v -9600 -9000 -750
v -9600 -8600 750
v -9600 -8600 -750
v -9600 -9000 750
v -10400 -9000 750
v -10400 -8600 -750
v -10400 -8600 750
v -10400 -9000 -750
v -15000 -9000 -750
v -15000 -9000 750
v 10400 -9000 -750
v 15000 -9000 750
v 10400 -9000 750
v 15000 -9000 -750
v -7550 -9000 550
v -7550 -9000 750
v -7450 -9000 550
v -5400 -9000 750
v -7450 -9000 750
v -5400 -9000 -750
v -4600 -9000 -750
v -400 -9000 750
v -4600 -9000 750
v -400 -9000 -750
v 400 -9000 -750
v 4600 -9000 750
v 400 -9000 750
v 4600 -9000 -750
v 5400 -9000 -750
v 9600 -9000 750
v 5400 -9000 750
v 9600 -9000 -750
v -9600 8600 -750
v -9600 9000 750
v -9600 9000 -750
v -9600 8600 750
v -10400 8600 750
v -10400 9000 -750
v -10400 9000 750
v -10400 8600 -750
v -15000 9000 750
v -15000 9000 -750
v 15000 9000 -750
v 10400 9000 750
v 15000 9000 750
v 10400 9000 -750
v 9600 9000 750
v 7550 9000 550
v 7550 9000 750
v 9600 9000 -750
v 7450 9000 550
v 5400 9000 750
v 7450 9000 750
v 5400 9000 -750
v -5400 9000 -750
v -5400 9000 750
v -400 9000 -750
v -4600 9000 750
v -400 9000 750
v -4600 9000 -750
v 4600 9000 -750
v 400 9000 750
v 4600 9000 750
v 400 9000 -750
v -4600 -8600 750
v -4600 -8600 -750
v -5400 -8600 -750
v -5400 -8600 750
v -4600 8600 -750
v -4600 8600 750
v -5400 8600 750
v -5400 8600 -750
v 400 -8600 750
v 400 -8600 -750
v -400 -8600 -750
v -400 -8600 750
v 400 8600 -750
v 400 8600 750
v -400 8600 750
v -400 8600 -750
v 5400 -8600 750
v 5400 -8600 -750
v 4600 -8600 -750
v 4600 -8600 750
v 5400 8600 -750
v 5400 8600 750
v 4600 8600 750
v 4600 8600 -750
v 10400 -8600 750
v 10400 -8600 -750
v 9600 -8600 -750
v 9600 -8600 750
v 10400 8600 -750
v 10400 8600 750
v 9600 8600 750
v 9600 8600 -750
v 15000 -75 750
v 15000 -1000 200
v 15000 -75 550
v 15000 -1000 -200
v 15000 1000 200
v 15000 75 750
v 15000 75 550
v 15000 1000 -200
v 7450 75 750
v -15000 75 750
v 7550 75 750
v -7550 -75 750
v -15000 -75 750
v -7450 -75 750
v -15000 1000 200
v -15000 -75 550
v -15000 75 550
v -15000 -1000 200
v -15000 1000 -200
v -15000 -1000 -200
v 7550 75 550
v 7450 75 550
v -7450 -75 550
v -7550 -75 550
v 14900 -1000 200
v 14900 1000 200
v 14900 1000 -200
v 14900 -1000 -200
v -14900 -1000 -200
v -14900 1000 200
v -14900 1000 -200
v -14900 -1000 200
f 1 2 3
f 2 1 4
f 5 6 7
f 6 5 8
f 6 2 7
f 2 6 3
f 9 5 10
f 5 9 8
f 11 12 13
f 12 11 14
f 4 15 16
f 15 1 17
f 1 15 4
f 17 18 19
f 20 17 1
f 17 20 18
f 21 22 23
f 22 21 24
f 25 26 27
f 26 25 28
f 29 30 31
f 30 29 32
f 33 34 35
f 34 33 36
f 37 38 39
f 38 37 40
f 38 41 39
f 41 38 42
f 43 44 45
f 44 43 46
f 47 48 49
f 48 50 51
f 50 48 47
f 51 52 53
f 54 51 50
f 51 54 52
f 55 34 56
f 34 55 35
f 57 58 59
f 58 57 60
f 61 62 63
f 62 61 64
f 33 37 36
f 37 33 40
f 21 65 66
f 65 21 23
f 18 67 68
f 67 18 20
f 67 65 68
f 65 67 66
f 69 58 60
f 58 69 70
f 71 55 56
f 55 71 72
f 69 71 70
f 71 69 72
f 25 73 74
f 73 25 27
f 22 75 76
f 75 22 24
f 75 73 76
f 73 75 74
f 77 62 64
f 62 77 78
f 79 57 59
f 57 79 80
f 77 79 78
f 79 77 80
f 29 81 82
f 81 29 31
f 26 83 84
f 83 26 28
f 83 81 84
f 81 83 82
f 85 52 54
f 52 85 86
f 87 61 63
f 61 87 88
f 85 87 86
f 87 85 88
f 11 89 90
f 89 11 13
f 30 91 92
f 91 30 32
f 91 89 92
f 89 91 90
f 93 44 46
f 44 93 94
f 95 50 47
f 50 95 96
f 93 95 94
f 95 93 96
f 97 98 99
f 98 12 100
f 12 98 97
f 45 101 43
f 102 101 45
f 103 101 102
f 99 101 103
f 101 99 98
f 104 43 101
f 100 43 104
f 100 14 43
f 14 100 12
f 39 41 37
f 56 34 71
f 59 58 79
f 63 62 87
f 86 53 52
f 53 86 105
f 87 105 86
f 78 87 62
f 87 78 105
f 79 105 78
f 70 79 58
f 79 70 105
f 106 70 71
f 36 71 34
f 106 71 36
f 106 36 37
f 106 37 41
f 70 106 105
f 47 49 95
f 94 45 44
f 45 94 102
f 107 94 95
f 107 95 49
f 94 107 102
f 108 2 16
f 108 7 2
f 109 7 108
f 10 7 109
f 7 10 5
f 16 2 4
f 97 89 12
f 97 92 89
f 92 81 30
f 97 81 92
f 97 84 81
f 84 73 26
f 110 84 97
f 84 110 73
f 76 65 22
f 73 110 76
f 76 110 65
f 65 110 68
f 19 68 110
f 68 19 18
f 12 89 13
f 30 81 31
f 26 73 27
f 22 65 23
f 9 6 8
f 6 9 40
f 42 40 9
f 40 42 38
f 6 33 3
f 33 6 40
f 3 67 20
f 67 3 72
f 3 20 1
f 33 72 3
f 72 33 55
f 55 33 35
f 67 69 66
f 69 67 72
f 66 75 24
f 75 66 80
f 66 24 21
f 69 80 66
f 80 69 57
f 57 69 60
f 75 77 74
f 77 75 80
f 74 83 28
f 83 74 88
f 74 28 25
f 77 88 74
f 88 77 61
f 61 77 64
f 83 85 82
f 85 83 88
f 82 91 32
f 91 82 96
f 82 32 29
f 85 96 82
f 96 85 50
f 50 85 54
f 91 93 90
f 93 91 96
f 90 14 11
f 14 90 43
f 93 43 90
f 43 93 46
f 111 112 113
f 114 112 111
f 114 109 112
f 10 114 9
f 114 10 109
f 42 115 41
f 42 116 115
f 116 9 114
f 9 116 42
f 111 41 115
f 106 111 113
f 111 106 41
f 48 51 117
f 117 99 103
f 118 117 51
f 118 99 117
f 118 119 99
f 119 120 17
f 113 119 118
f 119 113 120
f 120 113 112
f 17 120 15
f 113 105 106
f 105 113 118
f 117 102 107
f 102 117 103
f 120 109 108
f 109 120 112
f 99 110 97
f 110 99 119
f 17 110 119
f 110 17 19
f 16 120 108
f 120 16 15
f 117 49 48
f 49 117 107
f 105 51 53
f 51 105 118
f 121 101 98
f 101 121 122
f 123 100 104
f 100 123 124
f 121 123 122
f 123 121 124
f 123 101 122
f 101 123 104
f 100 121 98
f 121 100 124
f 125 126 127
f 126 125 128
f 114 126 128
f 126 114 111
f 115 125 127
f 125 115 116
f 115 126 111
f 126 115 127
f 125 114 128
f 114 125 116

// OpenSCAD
// =========================================================================
// GRUMMAN-STYLED INFLATABLE CARRIER - INTEGRATED MESH WITH DRAINAGE SCUPPERS
// MANUFACTURER: HUNTINGTON INGALLS / NEWPORT NEWS SHIPBUILDING
// MATERIAL PROFILE: GRADE 5 TITANIUM WITH PASSIVE DRAINAGE SLOTS
// =========================================================================

module titanium_harness_plate_v2(length=30000, width=18000, thickness=1500) {
    difference() {
        // Core Grade 5 Titanium Flatbed Hinge Plate
        cube([length, width, thickness], center=true);
        
        // Longitudinal Conduit Channel for Embedded 3oz Copper Power Bus
        translate([0, 0, thickness/2 - 100])
            cube([length + 20, 150, 200], center=true);
            
        // Left Divergent Feed for Continuous 12V Blower Power Routing
        translate([-length/4, -width/4, thickness/2 - 100])
            cube([100, width/2, 200], center=true);
            
        // Right Divergent Feed for Submersible Bilge Sump Power Routing
        translate([length/4, width/4, thickness/2 - 100])
            cube([100, width/2, 200], center=true);
            
        // Pocket Cuts at Hinge Faces for Flush 24K Gold Lattice Snap Junctions
        translate([length/2 - 50, 0, 0]) cube([100, 2000, 400], center=true);
        translate([-length/2 + 50, 0, 0]) cube([100, 2000, 400], center=true);
        
        // Passive One-Way Drainage Scuppers (Parametric Edge Slots)
        for (x_offset = [-length/3 : length/6 : length/3]) {
            // Left Margin Drainage Channels
            translate([x_offset, -width/2 + 200, 0])
                cube([800, 400, thickness + 20], center=true);
            // Right Margin Drainage Channels
            translate([x_offset, width/2 - 200, 0])
                cube([800, 400, thickness + 20], center=true);
        }
    }
}

// Instantiate fully detailed structural panel
titanium_harness_plate_v2();
